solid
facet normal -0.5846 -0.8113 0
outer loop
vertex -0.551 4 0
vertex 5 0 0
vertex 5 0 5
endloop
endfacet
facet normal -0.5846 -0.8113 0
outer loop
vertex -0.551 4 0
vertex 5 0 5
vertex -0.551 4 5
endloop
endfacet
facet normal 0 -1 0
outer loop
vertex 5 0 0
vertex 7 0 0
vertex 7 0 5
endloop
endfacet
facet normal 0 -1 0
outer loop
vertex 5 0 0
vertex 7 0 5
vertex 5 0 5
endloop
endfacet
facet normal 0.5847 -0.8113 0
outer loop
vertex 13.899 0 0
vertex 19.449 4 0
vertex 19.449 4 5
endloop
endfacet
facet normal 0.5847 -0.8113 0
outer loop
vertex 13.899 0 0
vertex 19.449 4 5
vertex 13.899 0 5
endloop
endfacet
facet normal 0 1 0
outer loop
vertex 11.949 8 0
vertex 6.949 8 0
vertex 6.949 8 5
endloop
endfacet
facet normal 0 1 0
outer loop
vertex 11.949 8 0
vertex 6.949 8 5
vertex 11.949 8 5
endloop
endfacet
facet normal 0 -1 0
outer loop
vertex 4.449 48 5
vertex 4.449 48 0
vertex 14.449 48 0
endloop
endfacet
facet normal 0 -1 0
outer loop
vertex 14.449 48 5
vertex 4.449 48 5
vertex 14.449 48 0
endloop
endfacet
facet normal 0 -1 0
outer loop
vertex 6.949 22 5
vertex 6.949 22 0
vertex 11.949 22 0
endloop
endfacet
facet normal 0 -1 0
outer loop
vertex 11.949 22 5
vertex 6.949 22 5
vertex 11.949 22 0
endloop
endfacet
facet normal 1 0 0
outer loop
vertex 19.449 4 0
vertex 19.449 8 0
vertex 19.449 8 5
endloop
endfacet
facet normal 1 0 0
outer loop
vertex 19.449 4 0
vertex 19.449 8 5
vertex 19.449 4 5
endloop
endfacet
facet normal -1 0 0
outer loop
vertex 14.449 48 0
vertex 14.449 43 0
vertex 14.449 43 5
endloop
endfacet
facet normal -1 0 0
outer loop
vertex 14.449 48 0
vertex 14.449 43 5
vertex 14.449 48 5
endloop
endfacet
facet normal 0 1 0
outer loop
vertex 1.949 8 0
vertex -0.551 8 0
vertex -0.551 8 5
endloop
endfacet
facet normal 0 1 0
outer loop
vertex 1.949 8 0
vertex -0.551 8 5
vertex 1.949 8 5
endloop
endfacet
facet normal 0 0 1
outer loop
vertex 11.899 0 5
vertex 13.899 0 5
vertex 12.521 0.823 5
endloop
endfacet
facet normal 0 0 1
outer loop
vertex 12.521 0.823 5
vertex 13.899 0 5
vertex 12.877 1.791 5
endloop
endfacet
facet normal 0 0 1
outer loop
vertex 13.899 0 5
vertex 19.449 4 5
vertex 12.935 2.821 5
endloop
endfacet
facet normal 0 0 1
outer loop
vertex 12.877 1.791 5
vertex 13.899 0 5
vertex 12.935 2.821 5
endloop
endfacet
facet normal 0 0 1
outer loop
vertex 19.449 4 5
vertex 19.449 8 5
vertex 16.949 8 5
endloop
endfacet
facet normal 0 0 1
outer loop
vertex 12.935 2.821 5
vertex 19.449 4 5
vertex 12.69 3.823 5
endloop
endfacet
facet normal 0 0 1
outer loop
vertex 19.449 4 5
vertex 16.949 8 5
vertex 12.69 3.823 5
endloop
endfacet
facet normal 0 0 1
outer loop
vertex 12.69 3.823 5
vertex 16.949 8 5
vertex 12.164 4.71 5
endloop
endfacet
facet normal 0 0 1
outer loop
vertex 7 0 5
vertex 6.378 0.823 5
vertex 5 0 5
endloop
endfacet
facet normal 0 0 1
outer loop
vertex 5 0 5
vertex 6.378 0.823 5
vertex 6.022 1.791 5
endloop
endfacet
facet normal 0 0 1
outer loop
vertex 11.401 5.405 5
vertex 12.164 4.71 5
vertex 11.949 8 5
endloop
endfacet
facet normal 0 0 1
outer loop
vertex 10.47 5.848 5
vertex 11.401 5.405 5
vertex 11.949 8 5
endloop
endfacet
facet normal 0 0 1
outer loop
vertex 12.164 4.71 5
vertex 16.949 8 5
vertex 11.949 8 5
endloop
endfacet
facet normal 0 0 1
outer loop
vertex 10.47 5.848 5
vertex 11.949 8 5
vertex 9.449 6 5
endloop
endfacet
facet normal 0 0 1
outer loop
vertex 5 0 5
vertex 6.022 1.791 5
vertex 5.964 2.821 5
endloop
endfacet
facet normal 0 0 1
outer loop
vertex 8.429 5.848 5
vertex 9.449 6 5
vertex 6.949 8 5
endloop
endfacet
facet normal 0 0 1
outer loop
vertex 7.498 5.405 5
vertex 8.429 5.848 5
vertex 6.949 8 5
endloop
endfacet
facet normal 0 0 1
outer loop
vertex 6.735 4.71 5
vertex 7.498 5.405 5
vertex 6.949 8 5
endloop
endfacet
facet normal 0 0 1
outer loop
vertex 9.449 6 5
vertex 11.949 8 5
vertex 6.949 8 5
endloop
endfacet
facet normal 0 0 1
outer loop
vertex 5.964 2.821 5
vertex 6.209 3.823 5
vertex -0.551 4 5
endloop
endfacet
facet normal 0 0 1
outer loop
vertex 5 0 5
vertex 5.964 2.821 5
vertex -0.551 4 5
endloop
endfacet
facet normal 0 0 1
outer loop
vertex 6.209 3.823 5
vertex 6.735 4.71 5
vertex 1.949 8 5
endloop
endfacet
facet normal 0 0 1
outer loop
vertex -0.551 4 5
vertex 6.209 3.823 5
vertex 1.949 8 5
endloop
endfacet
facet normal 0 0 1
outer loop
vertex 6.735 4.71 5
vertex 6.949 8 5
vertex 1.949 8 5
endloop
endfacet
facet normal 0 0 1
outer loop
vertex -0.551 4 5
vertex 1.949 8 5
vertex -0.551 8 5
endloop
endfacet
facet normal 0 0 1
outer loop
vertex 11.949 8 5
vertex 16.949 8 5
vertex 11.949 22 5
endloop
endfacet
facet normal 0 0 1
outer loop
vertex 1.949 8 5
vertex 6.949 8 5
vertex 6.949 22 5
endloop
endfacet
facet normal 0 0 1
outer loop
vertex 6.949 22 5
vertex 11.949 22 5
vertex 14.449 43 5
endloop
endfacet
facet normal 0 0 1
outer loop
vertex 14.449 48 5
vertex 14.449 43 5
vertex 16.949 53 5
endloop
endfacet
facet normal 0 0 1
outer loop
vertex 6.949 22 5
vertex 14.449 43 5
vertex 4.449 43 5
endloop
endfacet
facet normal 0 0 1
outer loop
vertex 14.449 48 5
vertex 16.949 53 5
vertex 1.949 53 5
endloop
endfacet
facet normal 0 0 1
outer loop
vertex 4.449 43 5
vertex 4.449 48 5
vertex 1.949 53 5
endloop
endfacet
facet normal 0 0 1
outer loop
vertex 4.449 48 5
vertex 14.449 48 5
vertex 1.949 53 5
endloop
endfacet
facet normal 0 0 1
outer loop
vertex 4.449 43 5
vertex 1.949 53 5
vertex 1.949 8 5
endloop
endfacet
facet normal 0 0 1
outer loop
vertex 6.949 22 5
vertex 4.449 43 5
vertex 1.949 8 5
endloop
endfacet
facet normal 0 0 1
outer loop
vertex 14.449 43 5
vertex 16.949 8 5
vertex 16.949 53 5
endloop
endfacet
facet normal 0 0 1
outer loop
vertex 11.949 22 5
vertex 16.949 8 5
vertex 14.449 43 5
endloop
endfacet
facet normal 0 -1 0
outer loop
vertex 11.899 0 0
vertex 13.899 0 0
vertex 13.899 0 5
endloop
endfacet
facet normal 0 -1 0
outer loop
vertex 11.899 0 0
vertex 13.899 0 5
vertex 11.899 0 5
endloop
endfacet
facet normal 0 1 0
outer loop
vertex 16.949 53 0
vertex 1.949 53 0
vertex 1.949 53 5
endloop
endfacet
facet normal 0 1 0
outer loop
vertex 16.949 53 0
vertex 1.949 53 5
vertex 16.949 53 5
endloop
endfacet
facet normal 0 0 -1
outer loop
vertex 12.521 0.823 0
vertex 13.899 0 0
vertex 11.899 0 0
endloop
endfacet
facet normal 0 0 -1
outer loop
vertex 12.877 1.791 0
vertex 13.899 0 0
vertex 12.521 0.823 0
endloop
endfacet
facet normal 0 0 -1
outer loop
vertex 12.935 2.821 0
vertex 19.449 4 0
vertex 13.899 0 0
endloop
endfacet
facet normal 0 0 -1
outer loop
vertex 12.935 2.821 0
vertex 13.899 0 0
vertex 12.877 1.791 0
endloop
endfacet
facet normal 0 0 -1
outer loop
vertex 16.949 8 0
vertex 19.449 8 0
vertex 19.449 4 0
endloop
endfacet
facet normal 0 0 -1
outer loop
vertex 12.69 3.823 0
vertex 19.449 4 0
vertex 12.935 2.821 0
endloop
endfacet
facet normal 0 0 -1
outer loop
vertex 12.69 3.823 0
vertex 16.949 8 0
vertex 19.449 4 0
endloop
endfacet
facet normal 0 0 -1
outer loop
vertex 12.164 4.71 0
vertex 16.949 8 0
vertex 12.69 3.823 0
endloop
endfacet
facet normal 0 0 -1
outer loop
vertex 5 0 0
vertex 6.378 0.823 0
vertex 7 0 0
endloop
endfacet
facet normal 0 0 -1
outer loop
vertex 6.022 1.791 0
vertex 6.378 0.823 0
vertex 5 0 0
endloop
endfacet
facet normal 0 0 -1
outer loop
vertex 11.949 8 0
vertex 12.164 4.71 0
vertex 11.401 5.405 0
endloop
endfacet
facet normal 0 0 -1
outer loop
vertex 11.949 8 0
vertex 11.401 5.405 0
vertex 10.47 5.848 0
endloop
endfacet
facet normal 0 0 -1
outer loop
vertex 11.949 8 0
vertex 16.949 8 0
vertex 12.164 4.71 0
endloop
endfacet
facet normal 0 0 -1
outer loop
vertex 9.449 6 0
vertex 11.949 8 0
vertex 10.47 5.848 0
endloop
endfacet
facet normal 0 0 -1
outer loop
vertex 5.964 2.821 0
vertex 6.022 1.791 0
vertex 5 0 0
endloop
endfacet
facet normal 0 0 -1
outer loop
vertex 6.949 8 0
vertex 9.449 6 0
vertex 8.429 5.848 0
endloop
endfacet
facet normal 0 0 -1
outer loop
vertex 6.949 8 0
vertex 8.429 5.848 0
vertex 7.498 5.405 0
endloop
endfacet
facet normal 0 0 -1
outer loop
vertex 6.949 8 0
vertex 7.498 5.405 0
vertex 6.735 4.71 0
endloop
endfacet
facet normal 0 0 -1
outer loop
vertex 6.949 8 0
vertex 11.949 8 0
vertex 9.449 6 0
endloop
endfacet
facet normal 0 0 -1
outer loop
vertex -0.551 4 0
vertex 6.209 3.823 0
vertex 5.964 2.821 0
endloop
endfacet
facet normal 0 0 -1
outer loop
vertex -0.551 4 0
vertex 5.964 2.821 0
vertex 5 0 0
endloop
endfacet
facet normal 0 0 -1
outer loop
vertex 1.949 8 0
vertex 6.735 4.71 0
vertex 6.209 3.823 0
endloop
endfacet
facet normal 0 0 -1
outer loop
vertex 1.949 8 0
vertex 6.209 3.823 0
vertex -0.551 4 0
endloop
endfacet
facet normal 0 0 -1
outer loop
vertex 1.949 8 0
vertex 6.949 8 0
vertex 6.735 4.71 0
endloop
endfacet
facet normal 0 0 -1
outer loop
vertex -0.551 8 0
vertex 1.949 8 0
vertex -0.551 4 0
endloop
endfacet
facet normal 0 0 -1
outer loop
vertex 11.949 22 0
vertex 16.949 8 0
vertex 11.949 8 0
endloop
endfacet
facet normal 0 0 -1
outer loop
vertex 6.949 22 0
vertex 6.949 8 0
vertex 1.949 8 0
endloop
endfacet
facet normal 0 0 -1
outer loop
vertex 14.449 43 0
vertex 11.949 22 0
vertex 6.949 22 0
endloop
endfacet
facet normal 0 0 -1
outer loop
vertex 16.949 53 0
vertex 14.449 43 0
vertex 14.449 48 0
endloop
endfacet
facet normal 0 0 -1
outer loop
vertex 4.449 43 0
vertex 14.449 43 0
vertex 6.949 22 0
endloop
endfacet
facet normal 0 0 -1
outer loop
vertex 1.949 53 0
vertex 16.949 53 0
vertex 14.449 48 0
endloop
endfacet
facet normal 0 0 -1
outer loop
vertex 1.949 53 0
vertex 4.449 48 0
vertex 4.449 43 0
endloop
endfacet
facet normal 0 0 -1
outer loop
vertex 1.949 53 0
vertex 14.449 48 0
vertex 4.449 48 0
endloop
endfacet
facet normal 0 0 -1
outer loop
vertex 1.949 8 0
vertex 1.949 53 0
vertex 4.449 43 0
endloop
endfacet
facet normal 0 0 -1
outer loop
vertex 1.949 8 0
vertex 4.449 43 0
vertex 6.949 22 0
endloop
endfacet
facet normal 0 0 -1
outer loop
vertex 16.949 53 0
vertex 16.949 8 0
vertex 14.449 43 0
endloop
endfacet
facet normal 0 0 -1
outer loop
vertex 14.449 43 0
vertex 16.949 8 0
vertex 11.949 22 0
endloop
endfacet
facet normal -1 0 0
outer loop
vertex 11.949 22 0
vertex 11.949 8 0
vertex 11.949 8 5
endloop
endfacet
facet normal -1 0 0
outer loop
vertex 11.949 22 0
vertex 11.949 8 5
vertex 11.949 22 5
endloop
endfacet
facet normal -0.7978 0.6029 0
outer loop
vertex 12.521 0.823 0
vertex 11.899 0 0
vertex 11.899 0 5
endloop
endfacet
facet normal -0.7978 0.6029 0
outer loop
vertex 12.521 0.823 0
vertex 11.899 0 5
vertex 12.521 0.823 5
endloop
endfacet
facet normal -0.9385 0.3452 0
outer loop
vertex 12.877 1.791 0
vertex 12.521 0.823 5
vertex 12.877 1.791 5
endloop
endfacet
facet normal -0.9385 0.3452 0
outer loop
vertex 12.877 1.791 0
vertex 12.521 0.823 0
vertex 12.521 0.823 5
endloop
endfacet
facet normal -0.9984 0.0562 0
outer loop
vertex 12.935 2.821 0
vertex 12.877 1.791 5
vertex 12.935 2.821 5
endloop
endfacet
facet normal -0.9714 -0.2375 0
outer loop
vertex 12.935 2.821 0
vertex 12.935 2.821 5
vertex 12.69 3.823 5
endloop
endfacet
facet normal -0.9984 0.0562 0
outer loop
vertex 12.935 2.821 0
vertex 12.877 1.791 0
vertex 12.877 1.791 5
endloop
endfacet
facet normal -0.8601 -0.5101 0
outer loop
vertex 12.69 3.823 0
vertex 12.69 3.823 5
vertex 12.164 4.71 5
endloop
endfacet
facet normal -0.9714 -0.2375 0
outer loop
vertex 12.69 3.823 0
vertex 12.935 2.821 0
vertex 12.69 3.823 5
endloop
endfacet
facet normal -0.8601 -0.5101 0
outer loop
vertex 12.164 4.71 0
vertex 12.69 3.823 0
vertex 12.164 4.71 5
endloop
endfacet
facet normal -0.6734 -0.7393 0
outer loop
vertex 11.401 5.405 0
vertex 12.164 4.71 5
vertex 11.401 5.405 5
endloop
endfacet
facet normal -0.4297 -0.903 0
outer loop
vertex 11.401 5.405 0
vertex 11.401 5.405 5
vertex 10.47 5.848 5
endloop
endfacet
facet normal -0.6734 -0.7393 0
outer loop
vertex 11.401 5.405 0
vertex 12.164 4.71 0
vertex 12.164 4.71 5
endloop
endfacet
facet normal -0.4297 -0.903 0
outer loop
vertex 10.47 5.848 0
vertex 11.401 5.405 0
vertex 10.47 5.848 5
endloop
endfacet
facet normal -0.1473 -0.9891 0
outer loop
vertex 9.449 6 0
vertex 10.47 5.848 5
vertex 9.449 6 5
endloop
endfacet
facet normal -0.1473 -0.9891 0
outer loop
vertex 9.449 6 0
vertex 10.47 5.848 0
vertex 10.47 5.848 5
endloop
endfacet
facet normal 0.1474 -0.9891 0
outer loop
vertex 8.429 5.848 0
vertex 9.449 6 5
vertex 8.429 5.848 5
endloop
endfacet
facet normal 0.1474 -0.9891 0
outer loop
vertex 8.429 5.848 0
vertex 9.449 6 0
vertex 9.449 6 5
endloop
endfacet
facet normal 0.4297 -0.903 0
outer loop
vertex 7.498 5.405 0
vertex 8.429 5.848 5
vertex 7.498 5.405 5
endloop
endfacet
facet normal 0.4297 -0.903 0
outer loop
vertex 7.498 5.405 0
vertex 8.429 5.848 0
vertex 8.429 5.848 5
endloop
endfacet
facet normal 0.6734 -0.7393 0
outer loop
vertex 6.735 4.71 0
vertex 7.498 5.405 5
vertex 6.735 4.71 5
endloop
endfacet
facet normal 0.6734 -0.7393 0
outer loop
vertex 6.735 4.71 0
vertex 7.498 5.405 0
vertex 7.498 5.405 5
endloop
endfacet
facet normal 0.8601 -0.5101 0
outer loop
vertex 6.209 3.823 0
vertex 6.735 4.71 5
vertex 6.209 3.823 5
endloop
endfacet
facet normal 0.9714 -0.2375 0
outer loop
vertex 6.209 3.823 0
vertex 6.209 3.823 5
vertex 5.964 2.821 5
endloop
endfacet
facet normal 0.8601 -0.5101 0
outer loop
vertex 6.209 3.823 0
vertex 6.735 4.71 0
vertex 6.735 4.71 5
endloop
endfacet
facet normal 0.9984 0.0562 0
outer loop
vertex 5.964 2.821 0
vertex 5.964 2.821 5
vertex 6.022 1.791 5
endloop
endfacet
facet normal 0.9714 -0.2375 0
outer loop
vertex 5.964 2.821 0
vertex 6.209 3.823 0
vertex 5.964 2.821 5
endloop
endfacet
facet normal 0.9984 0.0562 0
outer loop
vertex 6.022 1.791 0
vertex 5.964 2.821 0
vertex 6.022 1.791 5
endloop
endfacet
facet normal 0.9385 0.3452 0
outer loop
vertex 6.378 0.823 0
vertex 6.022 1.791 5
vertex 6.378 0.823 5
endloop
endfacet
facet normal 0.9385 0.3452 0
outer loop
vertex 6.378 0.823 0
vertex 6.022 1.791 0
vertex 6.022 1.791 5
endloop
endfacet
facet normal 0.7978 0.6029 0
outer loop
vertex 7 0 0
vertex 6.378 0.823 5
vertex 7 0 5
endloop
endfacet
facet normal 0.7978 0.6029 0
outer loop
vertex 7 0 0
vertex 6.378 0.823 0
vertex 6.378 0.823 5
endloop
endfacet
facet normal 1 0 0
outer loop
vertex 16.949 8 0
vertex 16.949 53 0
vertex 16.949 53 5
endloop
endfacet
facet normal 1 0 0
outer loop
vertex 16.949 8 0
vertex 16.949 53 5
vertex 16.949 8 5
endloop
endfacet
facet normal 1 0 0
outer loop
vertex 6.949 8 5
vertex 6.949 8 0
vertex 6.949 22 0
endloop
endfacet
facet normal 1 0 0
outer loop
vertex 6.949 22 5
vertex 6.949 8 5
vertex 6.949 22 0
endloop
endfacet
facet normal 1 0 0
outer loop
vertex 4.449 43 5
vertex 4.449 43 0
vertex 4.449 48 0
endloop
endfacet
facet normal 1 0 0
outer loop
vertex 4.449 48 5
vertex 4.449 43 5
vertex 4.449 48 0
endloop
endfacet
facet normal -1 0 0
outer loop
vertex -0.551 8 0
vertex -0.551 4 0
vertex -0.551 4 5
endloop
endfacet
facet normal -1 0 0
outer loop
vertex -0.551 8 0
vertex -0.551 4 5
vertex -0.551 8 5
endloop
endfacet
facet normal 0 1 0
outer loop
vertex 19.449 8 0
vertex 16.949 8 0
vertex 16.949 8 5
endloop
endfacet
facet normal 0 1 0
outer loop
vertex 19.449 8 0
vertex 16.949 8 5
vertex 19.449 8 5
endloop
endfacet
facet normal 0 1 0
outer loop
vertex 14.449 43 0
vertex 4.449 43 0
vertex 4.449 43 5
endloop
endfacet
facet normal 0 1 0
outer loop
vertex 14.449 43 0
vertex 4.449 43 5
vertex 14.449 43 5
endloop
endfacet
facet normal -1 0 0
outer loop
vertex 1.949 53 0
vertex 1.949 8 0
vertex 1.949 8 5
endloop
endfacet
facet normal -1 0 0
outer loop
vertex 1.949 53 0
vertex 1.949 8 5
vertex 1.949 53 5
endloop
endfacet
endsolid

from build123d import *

# Parameters (mm, degrees)
SKETCH1_W           = 5
SKETCH1_H           = 14
SKETCH1_W_2         = 10
SKETCH1_H_2         = 5
BOSS_EXTRUDE1_DEPTH = 5


with BuildPart() as part:
    # Sketch1 → Boss-Extrude1 (new body)
    with BuildSketch(Plane.XY):
        with BuildLine():
            Line((16.949489743, 8), (19.449489743, 8))
            Line((19.449489743, 8), (19.449489743, 4))
            Line((19.449489743, 4), (13.898979486, 0))
            Line((13.898979486, 0), (11.898979486, 0))
            ThreePointArc((11.898979486, 0), (9.449489743, 6), (7, 0))
            Line((7, 0), (5, 0))
            Line((5, 0), (-0.550510257, 4))
            Line((-0.550510257, 4), (-0.550510257, 8))
            Line((-0.550510257, 8), (1.949489743, 8))
            Line((1.949489743, 8), (1.949489743, 53))
            Line((1.949489743, 53), (16.949489743, 53))
            Line((16.949489743, 53), (16.949489743, 8))
        make_face()
        with Locations((9.449489743, 15)):
            Rectangle(SKETCH1_W, SKETCH1_H, mode=Mode.SUBTRACT)
        with Locations((9.449489743, 45.5)):
            Rectangle(SKETCH1_W_2, SKETCH1_H_2, mode=Mode.SUBTRACT)
    extrude(amount=BOSS_EXTRUDE1_DEPTH)


solid = part.part
